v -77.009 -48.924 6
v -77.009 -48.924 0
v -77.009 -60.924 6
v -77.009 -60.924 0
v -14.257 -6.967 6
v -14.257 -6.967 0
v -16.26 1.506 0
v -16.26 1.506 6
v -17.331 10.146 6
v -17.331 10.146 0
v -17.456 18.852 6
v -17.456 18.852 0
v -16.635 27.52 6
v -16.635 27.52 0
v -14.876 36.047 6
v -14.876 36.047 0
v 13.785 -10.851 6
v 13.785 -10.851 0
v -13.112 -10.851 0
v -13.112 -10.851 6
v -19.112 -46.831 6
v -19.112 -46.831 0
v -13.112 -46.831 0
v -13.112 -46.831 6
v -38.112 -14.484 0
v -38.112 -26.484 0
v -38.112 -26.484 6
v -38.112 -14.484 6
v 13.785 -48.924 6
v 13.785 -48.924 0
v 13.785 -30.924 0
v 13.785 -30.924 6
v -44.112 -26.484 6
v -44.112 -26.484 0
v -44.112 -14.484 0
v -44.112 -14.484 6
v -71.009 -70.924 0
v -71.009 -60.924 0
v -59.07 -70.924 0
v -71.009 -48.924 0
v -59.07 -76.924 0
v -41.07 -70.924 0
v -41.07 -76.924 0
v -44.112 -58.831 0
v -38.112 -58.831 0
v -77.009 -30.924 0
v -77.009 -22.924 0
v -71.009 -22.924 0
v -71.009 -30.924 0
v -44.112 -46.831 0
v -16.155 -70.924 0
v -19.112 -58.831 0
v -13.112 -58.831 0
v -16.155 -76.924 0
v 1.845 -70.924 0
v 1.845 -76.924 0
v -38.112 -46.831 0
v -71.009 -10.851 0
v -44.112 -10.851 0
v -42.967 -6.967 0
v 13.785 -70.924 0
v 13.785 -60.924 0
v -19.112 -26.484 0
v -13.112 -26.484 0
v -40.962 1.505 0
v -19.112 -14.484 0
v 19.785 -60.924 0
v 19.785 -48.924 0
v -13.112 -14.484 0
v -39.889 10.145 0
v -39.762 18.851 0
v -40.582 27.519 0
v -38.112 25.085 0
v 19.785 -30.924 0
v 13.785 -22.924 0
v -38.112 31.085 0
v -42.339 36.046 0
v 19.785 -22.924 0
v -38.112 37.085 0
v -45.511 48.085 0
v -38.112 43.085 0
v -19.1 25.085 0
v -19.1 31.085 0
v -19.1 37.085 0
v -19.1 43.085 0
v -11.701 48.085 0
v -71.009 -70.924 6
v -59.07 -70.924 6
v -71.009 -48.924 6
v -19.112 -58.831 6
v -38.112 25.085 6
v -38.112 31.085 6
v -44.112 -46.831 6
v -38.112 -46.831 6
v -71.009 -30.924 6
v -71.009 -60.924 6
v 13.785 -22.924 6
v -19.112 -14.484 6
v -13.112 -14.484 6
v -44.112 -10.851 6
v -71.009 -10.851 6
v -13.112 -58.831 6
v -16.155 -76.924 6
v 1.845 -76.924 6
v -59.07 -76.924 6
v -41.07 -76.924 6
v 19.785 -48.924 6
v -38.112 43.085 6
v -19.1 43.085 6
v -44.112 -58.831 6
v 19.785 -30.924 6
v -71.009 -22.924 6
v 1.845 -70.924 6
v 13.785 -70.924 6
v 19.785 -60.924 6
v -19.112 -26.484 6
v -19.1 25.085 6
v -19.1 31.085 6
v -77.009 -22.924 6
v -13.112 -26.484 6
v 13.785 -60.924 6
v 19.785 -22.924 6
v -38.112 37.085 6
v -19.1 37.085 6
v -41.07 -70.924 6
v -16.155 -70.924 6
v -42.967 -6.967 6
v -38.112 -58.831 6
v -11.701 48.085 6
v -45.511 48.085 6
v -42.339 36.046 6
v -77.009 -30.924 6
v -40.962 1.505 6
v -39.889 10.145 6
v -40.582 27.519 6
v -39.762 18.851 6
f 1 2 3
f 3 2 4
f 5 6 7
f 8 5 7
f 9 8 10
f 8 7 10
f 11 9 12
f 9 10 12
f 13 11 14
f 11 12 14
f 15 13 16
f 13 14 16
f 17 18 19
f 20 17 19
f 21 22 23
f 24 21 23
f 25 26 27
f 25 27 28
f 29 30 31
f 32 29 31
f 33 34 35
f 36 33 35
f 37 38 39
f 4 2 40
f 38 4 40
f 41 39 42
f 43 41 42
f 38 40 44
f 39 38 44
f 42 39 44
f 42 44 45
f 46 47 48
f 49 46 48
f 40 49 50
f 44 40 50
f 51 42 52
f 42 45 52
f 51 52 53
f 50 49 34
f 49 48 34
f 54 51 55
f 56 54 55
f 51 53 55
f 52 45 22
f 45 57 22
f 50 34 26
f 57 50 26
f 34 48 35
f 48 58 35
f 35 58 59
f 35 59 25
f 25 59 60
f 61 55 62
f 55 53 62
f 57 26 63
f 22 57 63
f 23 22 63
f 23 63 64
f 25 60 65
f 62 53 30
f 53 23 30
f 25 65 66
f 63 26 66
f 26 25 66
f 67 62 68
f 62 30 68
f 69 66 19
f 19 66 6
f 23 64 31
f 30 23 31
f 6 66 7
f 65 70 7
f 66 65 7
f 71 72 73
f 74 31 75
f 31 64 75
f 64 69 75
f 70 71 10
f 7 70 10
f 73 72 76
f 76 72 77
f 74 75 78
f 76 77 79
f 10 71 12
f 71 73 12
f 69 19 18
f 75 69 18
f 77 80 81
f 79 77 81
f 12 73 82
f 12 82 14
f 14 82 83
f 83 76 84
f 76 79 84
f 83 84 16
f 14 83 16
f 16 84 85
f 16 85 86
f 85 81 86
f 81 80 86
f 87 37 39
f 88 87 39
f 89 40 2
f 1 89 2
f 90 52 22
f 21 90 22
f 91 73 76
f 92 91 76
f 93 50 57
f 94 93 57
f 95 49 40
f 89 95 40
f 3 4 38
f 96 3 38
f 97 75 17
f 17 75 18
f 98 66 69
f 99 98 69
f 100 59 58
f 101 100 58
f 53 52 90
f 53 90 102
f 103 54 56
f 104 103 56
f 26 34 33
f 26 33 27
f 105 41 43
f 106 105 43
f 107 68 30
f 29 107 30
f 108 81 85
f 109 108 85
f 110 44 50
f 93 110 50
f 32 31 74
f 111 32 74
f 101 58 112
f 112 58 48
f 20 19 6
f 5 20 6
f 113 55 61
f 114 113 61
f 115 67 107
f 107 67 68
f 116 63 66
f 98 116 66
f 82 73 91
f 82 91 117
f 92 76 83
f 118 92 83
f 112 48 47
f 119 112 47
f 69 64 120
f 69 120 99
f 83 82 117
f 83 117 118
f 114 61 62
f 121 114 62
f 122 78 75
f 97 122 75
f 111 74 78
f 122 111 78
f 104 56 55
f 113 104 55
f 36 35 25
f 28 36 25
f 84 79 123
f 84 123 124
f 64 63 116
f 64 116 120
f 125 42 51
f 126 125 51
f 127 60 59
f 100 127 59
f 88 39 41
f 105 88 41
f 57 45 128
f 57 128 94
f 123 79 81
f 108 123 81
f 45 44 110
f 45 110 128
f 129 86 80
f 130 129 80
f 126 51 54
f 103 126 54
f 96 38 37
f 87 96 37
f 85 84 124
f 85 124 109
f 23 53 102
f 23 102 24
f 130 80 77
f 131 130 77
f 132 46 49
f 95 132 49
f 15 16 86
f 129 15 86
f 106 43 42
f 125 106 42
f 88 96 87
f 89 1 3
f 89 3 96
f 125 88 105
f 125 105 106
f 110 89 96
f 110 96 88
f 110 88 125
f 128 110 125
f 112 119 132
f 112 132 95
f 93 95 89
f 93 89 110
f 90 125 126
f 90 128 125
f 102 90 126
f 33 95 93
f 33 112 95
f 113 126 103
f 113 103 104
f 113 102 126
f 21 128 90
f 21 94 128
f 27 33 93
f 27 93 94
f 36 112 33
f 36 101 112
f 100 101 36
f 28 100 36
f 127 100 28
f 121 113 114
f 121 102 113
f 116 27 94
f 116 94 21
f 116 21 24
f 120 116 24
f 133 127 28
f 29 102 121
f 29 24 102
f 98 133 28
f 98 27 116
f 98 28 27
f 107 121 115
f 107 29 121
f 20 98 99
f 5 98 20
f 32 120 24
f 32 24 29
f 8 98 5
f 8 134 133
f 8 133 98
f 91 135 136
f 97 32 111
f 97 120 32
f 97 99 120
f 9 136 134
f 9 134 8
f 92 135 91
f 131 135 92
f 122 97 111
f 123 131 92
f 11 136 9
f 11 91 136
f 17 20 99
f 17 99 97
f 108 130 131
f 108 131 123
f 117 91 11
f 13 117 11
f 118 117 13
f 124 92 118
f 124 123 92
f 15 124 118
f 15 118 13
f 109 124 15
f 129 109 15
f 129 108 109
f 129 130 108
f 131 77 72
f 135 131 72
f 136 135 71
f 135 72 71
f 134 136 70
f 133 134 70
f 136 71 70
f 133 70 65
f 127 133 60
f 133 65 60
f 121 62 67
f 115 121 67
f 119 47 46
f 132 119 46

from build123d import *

# Parameters (mm, degrees)
SKETCH1_W           = 6
SKETCH1_H           = 12
SKETCH1_W_2         = 19.012644139
SKETCH1_H_2         = 6
BOSS_EXTRUDE1_DEPTH = 6


with BuildPart() as part:
    # Sketch1 → Boss-Extrude1 (new body)
    with BuildSketch(Plane.XY):
        with BuildLine():
            Line((-71.009489367, -30.923530446), (-71.009489367, -48.923530446))
            Line((-71.009489367, -48.923530446), (-77.009489367, -48.923530446))
            Line((-77.009489367, -48.923530446), (-77.009489367, -60.923530446))
            Line((-77.009489367, -60.923530446), (-71.009489367, -60.923530446))
            Line((-71.009489367, -60.923530446), (-71.009489367, -70.923530446))
            Line((-71.009489367, -70.923530446), (-59.069535867, -70.923530446))
            Line((-59.069535867, -70.923530446), (-59.069535867, -76.923530446))
            Line((-59.069535867, -76.923530446), (-41.069535867, -76.923530446))
            Line((-41.069535867, -76.923530446), (-41.069535867, -70.923530446))
            Line((-41.069535867, -70.923530446), (-16.155263667, -70.923530446))
            Line((-16.155263667, -70.923530446), (-16.155263667, -76.923530446))
            Line((-16.155263667, -76.923530446), (1.844736333, -76.923530446))
            Line((1.844736333, -76.923530446), (1.844736333, -70.923530446))
            Line((1.844736333, -70.923530446), (13.784689833, -70.923530446))
            Line((13.784689833, -70.923530446), (13.784689833, -60.923530446))
            Line((13.784689833, -60.923530446), (19.784689833, -60.923530446))
            Line((19.784689833, -60.923530446), (19.784689833, -48.923530446))
            Line((19.784689833, -48.923530446), (13.784689833, -48.923530446))
            Line((13.784689833, -48.923530446), (13.784689833, -30.923530446))
            Line((13.784689833, -30.923530446), (19.784689833, -30.923530446))
            Line((19.784689833, -30.923530446), (19.784689833, -22.923530446))
            Line((19.784689833, -22.923530446), (13.784689833, -22.923530446))
            Line((13.784689833, -22.923530446), (13.784689833, -10.85146976))
            Line((13.784689833, -10.85146976), (-13.112399767, -10.85146976))
            Line((-13.112399767, -10.85146976), (-14.257146074, -6.967198767))
            ThreePointArc((-14.257146074, -6.967198767), (-17.512012302, 14.497312555), (-14.875995677, 36.046577434))
            Line((-14.875995677, 36.046577434), (-11.701450566, 48.085223564))
            Line((-11.701450566, 48.085223564), (-45.510704829, 48.085223564))
            Line((-45.510704829, 48.085223564), (-42.338764303, 36.045890917))
            ThreePointArc((-42.338764303, 36.045890917), (-39.707407485, 14.496217042), (-42.966828756, -6.967441914))
            Line((-42.966828756, -6.967441914), (-44.112399767, -10.85146976))
            Line((-44.112399767, -10.85146976), (-71.009489367, -10.85146976))
            Line((-71.009489367, -10.85146976), (-71.009489367, -22.923530446))
            Line((-71.009489367, -22.923530446), (-77.009489367, -22.923530446))
            Line((-77.009489367, -22.923530446), (-77.009489367, -30.923530446))
            Line((-77.009489367, -30.923530446), (-71.009489367, -30.923530446))
        make_face()
        with Locations((-41.112399767, -52.830649895)):
            Rectangle(SKETCH1_W, SKETCH1_H, mode=Mode.SUBTRACT)
        with Locations((-41.112399767, -20.484459594)):
            Rectangle(SKETCH1_W, SKETCH1_H, mode=Mode.SUBTRACT)
        with Locations((-16.112399767, -20.484459594)):
            Rectangle(SKETCH1_W, SKETCH1_H, mode=Mode.SUBTRACT)
        with Locations((-16.112399767, -52.830649895)):
            Rectangle(SKETCH1_W, SKETCH1_H, mode=Mode.SUBTRACT)
        with Locations((-28.606077697, 40.085223564)):
            Rectangle(SKETCH1_W_2, SKETCH1_H_2, mode=Mode.SUBTRACT)
        with Locations((-28.606077697, 28.085223564)):
            Rectangle(SKETCH1_W_2, SKETCH1_H_2, mode=Mode.SUBTRACT)
    extrude(amount=BOSS_EXTRUDE1_DEPTH)


solid = part.part
